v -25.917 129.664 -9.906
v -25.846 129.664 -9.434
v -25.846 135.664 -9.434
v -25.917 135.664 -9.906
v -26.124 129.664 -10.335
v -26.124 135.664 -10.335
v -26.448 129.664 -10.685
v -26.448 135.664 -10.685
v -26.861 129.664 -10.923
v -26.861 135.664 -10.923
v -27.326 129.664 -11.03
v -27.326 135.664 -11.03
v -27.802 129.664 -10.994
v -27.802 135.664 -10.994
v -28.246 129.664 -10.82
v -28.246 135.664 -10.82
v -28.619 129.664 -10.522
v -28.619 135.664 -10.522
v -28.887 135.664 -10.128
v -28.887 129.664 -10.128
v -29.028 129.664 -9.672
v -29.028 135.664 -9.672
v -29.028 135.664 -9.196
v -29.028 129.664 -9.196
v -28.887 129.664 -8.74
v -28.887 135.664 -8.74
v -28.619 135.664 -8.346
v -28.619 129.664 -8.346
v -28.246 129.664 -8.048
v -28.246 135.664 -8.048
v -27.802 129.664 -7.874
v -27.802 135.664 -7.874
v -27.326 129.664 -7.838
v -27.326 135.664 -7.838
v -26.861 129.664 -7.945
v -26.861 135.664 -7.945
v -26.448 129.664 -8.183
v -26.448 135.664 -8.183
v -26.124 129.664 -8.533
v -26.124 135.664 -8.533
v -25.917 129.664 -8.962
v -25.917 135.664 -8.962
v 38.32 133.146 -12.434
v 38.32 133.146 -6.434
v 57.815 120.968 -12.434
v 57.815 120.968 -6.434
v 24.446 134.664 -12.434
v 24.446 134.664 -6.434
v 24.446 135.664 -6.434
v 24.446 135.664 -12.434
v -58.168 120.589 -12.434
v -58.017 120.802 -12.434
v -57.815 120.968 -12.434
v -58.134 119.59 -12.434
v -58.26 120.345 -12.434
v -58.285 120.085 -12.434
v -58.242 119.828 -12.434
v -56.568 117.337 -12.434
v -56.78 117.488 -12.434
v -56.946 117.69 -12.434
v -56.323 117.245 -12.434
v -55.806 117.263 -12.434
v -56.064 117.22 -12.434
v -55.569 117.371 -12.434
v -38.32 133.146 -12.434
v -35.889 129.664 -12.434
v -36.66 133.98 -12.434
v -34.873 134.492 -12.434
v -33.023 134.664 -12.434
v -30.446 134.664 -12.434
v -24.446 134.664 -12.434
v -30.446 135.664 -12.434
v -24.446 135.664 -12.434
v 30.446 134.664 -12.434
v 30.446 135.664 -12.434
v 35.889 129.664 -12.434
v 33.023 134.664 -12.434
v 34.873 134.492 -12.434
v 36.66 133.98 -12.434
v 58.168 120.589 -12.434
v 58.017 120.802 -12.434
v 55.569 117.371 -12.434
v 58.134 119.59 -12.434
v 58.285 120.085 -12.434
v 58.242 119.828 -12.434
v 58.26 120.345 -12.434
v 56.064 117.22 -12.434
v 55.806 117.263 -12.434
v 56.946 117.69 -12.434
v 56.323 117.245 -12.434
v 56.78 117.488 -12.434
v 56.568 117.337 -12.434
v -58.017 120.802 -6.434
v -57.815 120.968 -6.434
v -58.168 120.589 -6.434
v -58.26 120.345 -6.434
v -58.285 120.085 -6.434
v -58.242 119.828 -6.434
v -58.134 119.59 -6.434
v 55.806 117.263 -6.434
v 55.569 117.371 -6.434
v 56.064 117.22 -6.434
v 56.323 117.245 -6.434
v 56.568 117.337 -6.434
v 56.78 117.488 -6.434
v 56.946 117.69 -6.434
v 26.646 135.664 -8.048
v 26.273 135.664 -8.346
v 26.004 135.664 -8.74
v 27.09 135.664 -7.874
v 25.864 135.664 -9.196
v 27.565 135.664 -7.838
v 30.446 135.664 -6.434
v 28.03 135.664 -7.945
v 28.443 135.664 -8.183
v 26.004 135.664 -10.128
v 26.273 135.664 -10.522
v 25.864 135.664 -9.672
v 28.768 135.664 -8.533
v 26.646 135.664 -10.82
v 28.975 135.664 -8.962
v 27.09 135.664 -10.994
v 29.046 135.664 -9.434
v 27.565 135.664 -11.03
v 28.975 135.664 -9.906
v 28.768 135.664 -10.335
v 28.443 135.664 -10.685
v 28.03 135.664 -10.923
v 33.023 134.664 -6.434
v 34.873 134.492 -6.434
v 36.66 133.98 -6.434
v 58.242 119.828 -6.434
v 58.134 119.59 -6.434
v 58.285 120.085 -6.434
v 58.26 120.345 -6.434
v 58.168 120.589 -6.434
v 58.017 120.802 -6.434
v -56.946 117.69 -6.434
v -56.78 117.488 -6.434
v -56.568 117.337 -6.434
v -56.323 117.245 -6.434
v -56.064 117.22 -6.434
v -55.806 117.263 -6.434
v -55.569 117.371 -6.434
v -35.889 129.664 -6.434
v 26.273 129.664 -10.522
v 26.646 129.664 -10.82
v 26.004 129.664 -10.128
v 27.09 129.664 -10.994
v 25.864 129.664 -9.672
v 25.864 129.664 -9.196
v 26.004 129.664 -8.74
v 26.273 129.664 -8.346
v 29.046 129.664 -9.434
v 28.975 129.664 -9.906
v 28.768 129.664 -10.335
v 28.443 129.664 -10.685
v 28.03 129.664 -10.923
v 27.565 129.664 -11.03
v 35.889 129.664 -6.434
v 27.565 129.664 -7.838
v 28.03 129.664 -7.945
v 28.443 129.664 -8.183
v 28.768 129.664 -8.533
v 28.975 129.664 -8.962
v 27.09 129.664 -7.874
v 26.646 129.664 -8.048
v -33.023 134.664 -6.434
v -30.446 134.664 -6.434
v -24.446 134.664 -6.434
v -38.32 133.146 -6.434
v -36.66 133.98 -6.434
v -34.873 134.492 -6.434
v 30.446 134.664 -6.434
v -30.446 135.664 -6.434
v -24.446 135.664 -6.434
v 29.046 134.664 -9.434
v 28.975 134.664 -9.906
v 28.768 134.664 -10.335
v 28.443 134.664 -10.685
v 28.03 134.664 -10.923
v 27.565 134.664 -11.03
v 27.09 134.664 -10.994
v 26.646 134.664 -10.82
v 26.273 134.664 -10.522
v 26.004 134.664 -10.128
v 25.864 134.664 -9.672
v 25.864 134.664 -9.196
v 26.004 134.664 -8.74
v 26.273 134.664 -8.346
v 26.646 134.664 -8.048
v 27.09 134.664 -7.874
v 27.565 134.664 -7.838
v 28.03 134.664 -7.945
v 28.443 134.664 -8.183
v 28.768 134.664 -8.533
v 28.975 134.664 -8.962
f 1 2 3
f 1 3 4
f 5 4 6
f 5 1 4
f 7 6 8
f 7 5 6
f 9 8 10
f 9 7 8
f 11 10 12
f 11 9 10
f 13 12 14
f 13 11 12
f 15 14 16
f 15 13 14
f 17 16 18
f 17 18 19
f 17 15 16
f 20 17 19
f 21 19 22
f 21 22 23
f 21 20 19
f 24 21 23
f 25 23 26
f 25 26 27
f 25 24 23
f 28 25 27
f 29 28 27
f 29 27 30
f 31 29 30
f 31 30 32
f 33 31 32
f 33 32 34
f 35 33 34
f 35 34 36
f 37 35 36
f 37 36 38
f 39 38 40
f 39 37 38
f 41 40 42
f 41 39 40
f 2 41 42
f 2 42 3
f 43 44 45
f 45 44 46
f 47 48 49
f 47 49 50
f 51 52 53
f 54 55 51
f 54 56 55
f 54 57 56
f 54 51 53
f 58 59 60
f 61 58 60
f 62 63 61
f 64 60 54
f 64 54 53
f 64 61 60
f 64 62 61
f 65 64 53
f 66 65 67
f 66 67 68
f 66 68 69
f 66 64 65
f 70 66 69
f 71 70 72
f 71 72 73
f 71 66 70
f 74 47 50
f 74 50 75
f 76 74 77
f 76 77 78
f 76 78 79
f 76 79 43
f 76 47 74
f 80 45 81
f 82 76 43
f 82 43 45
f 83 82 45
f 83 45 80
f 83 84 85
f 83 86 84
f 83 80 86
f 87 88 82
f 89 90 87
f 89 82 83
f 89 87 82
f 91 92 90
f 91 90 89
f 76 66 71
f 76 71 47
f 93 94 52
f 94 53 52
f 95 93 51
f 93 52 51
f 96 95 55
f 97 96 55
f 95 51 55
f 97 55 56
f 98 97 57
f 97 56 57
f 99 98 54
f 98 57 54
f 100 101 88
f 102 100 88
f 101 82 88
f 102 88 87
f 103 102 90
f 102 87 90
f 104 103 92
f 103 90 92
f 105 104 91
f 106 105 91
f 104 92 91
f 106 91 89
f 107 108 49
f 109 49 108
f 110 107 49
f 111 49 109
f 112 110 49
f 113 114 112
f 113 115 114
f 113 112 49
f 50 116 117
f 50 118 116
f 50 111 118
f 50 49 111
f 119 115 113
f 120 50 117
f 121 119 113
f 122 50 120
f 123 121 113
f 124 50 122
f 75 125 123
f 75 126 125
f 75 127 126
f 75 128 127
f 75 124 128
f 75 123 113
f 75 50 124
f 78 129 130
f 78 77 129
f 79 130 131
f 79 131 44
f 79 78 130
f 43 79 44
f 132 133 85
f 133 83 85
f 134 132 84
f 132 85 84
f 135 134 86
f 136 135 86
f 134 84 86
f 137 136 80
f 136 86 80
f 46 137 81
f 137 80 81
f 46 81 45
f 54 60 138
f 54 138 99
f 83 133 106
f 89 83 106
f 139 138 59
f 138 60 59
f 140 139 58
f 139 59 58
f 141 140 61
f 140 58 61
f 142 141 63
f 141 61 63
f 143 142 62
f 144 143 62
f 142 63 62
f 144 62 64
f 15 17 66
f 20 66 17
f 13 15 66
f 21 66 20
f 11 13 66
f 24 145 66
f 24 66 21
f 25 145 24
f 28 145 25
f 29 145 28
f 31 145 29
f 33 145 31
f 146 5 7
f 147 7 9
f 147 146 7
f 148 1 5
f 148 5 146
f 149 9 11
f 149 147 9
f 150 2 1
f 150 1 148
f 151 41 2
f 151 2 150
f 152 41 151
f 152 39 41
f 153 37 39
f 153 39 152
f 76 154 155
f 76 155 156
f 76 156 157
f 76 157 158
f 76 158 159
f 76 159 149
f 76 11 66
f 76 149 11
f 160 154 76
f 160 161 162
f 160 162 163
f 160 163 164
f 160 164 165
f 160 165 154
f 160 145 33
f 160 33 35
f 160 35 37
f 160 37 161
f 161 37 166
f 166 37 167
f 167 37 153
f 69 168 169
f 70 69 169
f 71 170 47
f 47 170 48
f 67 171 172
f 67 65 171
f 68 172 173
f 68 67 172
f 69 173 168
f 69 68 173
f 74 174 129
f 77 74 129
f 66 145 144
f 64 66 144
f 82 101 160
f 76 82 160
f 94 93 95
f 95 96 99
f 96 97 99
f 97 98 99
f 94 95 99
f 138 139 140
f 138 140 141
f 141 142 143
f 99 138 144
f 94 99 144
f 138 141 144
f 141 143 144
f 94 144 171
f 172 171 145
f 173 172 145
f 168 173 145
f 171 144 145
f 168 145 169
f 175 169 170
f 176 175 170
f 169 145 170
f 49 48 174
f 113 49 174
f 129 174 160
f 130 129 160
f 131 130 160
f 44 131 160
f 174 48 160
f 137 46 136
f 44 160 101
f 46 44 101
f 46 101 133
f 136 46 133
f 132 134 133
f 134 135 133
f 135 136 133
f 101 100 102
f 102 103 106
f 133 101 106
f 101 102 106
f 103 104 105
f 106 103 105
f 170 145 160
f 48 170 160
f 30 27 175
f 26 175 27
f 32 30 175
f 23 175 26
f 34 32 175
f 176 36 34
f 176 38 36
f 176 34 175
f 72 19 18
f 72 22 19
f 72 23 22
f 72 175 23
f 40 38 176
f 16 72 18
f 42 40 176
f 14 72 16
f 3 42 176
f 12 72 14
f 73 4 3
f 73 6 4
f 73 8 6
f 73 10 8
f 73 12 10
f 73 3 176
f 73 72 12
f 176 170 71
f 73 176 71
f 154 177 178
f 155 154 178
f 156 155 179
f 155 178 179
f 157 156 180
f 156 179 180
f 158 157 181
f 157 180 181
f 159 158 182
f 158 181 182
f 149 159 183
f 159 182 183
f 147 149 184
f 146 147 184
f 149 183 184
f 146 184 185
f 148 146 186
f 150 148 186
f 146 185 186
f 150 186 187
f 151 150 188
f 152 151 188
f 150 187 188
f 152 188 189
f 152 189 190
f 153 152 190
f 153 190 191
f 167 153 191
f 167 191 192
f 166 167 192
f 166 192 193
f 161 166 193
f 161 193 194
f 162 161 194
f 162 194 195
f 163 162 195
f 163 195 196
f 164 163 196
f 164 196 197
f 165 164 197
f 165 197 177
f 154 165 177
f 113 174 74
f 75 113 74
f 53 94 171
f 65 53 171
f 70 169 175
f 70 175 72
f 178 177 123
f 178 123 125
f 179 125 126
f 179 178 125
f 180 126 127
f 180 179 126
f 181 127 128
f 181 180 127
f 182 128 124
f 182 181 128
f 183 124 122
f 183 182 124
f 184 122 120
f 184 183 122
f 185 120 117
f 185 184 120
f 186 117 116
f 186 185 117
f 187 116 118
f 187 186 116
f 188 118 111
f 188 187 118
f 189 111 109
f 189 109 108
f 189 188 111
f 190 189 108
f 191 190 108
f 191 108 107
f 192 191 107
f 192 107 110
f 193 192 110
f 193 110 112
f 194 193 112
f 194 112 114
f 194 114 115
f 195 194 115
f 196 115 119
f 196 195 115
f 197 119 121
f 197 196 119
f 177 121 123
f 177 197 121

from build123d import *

# Parameters (mm, degrees)
EXTRUDE_1_DEPTH      = 3
SKETCH_7_R           = 2.25
CUT_EXTRUDE_2_DEPTH  = 4.0000001
SKETCH_8_R           = 8
CUT_EXTRUDE_3_DEPTH  = 4.0000001
CUT_EXTRUDE_4_DEPTH  = 3
CUT_EXTRUDE_5_DEPTH  = 3
CUT_EXTRUDE_8_DEPTH  = 3
SKETCH_12_R          = 1.7
CUT_EXTRUDE_9_DEPTH  = 3
SKETCH_13_R          = 1.7
CUT_EXTRUDE_11_DEPTH = 3
CUT_EXTRUDE_12_DEPTH = 4.0000001
FILLET_1_R           = 2
FILLET_2_R           = 2
CUT_EXTRUDE_13_DEPTH = 4.0000001
CUT_EXTRUDE_14_DEPTH = 4.0000001
CUT_EXTRUDE_15_DEPTH = 4.0000001
CUT_EXTRUDE_16_DEPTH = 4.0000001
SKETCH_19_W          = 174.604309186
SKETCH_19_H          = 153.794857067
CUT_EXTRUDE_17_DEPTH = 10
SKETCH_20_R          = 1.7
SKETCH_20_R_2        = 2.929115441
EXTRUDE_2_DEPTH      = 5
SKETCH_21_W          = 71.778327268
SKETCH_21_H          = 4.999657954
EXTRUDE_3_DEPTH      = 5
EXTRUDE_4_DEPTH      = 5
FILLET_3_R           = 10
SKETCH_23_W          = 71.778327268
SKETCH_23_H          = 4.999657954
EXTRUDE_5_DEPTH      = 5
FILLET_4_R           = 1
SKETCH_24_W          = 6
SKETCH_24_H          = 4.999657954
EXTRUDE_7_DEPTH      = 55
EXTRUDE_8_DEPTH      = 4.999658
FILLET_5_R           = 8
FILLET_6_R           = 12
SKETCH_27_W          = 5
SKETCH_27_H          = 6
EXTRUDE_9_DEPTH      = 4.999658
FILLET_7_R           = 1
FILLET_8_R           = 1
FILLET_9_R           = 1
SKETCH_28_R          = 1.6
CUT_EXTRUDE_19_DEPTH = 50
EXTRUDE_10_DEPTH     = 6
SKETCH_33_R          = 1.6
CUT_EXTRUDE_21_DEPTH = 10.999657954
SKETCH_34_W          = 162.843072653
SKETCH_34_H          = 93.113374014
CUT_EXTRUDE_22_DEPTH = 10
SKETCH_35_W          = 6
SKETCH_35_H          = 6
SKETCH_35_R          = 1.6
EXTRUDE_11_DEPTH     = 1
CUT_EXTRUDE_23_DEPTH = 90
SKETCH_37_W          = 26
SKETCH_37_H          = 5
CUT_EXTRUDE_24_DEPTH = 90
FILLET_10_R          = 10
FILLET_11_R          = 1


with BuildPart() as part:
    # 草图1 → 凸台-拉伸1 (new body)
    with BuildSketch(Plane.XY):
        with BuildLine():
            Line((60, 106.603296002), (35.889163634, 121.664519159))
            Line((35.889163634, 121.664519159), (-35.889163634, 121.664519159))
            Line((-35.889163634, 121.664519159), (-60, 106.603296002))
            Line((-60, 106.603296002), (-60, 94.801892265))
            Line((-60, 94.801892265), (-45, 94.801892265))
            ThreePointArc((-45, 94.801892265), (-43.762563133, 94.289329132), (-43.25, 93.051892265))
            Line((-43.25, 93.051892265), (-37.75, 93.051892265))
            ThreePointArc((-37.75, 93.051892265), (-37.237436867, 94.289329132), (-36, 94.801892265))
            Line((-36, 94.801892265), (-21, 94.801892265))
            ThreePointArc((-21, 94.801892265), (-19.762563133, 94.289329132), (-19.25, 93.051892265))
            Line((-19.25, 93.051892265), (19.25, 93.051892265))
            ThreePointArc((19.25, 93.051892265), (19.762563133, 94.289329132), (21, 94.801892265))
            Line((21, 94.801892265), (36, 94.801892265))
            ThreePointArc((36, 94.801892265), (37.237436867, 94.289329132), (37.75, 93.051892265))
            Line((37.75, 93.051892265), (43.25, 93.051892265))
            ThreePointArc((43.25, 93.051892265), (43.762563133, 94.289329132), (45, 94.801892265))
            Line((45, 94.801892265), (60, 94.801892265))
            Line((60, 94.801892265), (60, 106.603296002))
        make_face()
        with BuildLine():
            Line((66.901694095, 102.292041372), (60, 106.603296002))
            Line((60, 106.603296002), (60, 94.801892265))
            ThreePointArc((60, 94.801892265), (61.237436867, 94.289329132), (61.75, 93.051892265))
            Line((61.75, 93.051892265), (66.901694095, 93.051892265))
            Line((66.901694095, 93.051892265), (66.901694095, 102.292041372))
        make_face()
        with BuildLine():
            Line((-60, 94.801892265), (-60, 106.603296002))
            Line((-60, 106.603296002), (-66.901694095, 102.292041372))
            Line((-66.901694095, 102.292041372), (-66.901694095, 93.051892265))
            Line((-66.901694095, 93.051892265), (-61.75, 93.051892265))
            ThreePointArc((-61.75, 93.051892265), (-61.237436867, 94.289329132), (-60, 94.801892265))
        make_face()
        with BuildLine():
            Line((66.901694095, 63.051892265), (66.901694095, 93.051892265))
            Line((66.901694095, 93.051892265), (61.75, 93.051892265))
            ThreePointArc((61.75, 93.051892265), (61.237436867, 91.814455398), (60, 91.301892265))
            Line((60, 91.301892265), (60, 64.801892265))
            ThreePointArc((60, 64.801892265), (61.237436867, 64.289329132), (61.75, 63.051892265))
            Line((61.75, 63.051892265), (66.901694095, 63.051892265))
        make_face()
        with BuildLine():
            Line((-61.75, 93.051892265), (-66.901694095, 93.051892265))
            Line((-66.901694095, 93.051892265), (-66.901694095, 63.051892265))
            Line((-66.901694095, 63.051892265), (-61.75, 63.051892265))
            ThreePointArc((-61.75, 63.051892265), (-61.237436867, 64.289329132), (-60, 64.801892265))
            Line((-60, 64.801892265), (-60, 91.301892265))
            ThreePointArc((-60, 91.301892265), (-61.237436867, 91.814455398), (-61.75, 93.051892265))
        make_face()
        with BuildLine():
            Line((66.901694095, 52.870133869), (66.901694095, 63.051892265))
            Line((66.901694095, 63.051892265), (61.75, 63.051892265))
            ThreePointArc((61.75, 63.051892265), (61.237436867, 61.814455398), (60, 61.301892265))
            Line((60, 61.301892265), (60, 31.261343001))
            Line((60, 31.261343001), (75, 31.261343001))
            Line((75, 31.261343001), (75, 40.933889795))
            ThreePointArc((75, 40.933889795), (69.117351927, 45.658052319), (66.901694095, 52.870133869))
        make_face()
        with BuildLine():
            Line((60, 64.801892265), (60, 91.301892265))
            Line((60, 91.301892265), (45, 91.301892265))
            ThreePointArc((45, 91.301892265), (43.762563133, 91.814455398), (43.25, 93.051892265))
            Line((43.25, 93.051892265), (37.75, 93.051892265))
            ThreePointArc((37.75, 93.051892265), (37.237436867, 91.814455398), (36, 91.301892265))
            Line((36, 91.301892265), (21, 91.301892265))
            ThreePointArc((21, 91.301892265), (19.762563133, 91.814455398), (19.25, 93.051892265))
            Line((19.25, 93.051892265), (-19.25, 93.051892265))
            ThreePointArc((-19.25, 93.051892265), (-19.762563133, 91.814455398), (-21, 91.301892265))
            Line((-21, 91.301892265), (-36, 91.301892265))
            ThreePointArc((-36, 91.301892265), (-37.237436867, 91.814455398), (-37.75, 93.051892265))
            Line((-37.75, 93.051892265), (-43.25, 93.051892265))
            ThreePointArc((-43.25, 93.051892265), (-43.762563133, 91.814455398), (-45, 91.301892265))
            Line((-45, 91.301892265), (-60, 91.301892265))
            Line((-60, 91.301892265), (-60, 64.801892265))
            Line((-60, 64.801892265), (-45, 64.801892265))
            ThreePointArc((-45, 64.801892265), (-43.762563133, 64.289329132), (-43.25, 63.051892265))
            Line((-43.25, 63.051892265), (-37.75, 63.051892265))
            ThreePointArc((-37.75, 63.051892265), (-37.237436867, 64.289329132), (-36, 64.801892265))
            Line((-36, 64.801892265), (-21, 64.801892265))
            ThreePointArc((-21, 64.801892265), (-19.762563133, 64.289329132), (-19.25, 63.051892265))
            Line((-19.25, 63.051892265), (19.25, 63.051892265))
            ThreePointArc((19.25, 63.051892265), (19.762563133, 64.289329132), (21, 64.801892265))
            Line((21, 64.801892265), (36, 64.801892265))
            ThreePointArc((36, 64.801892265), (37.237436867, 64.289329132), (37.75, 63.051892265))
            Line((37.75, 63.051892265), (43.25, 63.051892265))
            ThreePointArc((43.25, 63.051892265), (43.762563133, 64.289329132), (45, 64.801892265))
            Line((45, 64.801892265), (60, 64.801892265))
        make_face()
        with BuildLine():
            Line((-61.75, 63.051892265), (-66.901694095, 63.051892265))
            Line((-66.901694095, 63.051892265), (-66.901694095, 52.870133869))
            ThreePointArc((-66.901694095, 52.870133869), (-69.117351927, 45.658052319), (-75, 40.933889795))
            Line((-75, 40.933889795), (-75, 31.261343001))
            Line((-75, 31.261343001), (-60, 31.261343001))
            Line((-60, 31.261343001), (-60, 61.301892265))
            ThreePointArc((-60, 61.301892265), (-61.237436867, 61.814455398), (-61.75, 63.051892265))
        make_face()
        with BuildLine():
            Line((60, 31.261343001), (60, 61.301892265))
            Line((60, 61.301892265), (45, 61.301892265))
            ThreePointArc((45, 61.301892265), (43.762563133, 61.814455398), (43.25, 63.051892265))
            Line((43.25, 63.051892265), (37.75, 63.051892265))
            ThreePointArc((37.75, 63.051892265), (37.237436867, 61.814455398), (36, 61.301892265))
            Line((36, 61.301892265), (21, 61.301892265))
            ThreePointArc((21, 61.301892265), (19.762563133, 61.814455398), (19.25, 63.051892265))
            Line((19.25, 63.051892265), (-19.25, 63.051892265))
            ThreePointArc((-19.25, 63.051892265), (-19.762563133, 61.814455398), (-21, 61.301892265))
            Line((-21, 61.301892265), (-36, 61.301892265))
            ThreePointArc((-36, 61.301892265), (-37.237436867, 61.814455398), (-37.75, 63.051892265))
            Line((-37.75, 63.051892265), (-43.25, 63.051892265))
            ThreePointArc((-43.25, 63.051892265), (-43.762563133, 61.814455398), (-45, 61.301892265))
            Line((-45, 61.301892265), (-60, 61.301892265))
            Line((-60, 61.301892265), (-60, 31.261343001))
            Line((-60, 31.261343001), (60, 31.261343001))
        make_face()
        with BuildLine():
            Line((60, -58.312864289), (60, 23.940028391))
            Line((60, 23.940028391), (-60, 23.940028391))
            Line((-60, 23.940028391), (-60, -58.312864289))
            Line((-60, -58.312864289), (-45, -58.312864289))
            ThreePointArc((-45, -58.312864289), (-43.25, -60.062864289), (-45, -61.812864289))
            Line((-45, -61.812864289), (-60, -61.812864289))
            Line((-60, -61.812864289), (-60, -88.312864289))
            Line((-60, -88.312864289), (-45, -88.312864289))
            ThreePointArc((-45, -88.312864289), (-43.25, -90.062864289), (-45, -91.812864289))
            Line((-45, -91.812864289), (-60, -91.812864289))
            Line((-60, -91.812864289), (-60, -111.849967256))
            Line((-60, -111.849967256), (-38.845469114, -105.590576733))
            ThreePointArc((-38.845469114, -105.590576733), (-36.037784492, -104.975210108), (-33.17088573, -104.768665882))
            Line((-33.17088573, -104.768665882), (33.17088573, -104.768665882))
            ThreePointArc((33.17088573, -104.768665882), (36.037784492, -104.975210108), (38.845469114, -105.590576733))
            Line((38.845469114, -105.590576733), (60, -111.849967256))
            Line((60, -111.849967256), (60, -91.812864289))
            Line((60, -91.812864289), (45, -91.812864289))
            ThreePointArc((45, -91.812864289), (43.762563133, -91.300301156), (43.25, -90.062864289))
            ThreePointArc((43.25, -90.062864289), (43.762563133, -88.825427422), (45, -88.312864289))
            Line((45, -88.312864289), (60, -88.312864289))
            Line((60, -88.312864289), (60, -61.812864289))
            Line((60, -61.812864289), (45, -61.812864289))
            ThreePointArc((45, -61.812864289), (43.762563133, -61.300301156), (43.25, -60.062864289))
            ThreePointArc((43.25, -60.062864289), (43.762563133, -58.825427422), (45, -58.312864289))
            Line((45, -58.312864289), (60, -58.312864289))
        make_face()
        with BuildLine():
            ThreePointArc((-21, -88.312864289), (-19.762563133, -88.825427422), (-19.25, -90.062864289))
            ThreePointArc((-19.25, -90.062864289), (-19.762563133, -91.300301156), (-21, -91.812864289))
            Line((-21, -91.812864289), (-36, -91.812864289))
            ThreePointArc((-36, -91.812864289), (-37.75, -90.062864289), (-36, -88.312864289))
            Line((-36, -88.312864289), (-21, -88.312864289))
        make_face(mode=Mode.SUBTRACT)
        with BuildLine():
            ThreePointArc((-21, -58.312864289), (-19.762563133, -58.825427422), (-19.25, -60.062864289))
            ThreePointArc((-19.25, -60.062864289), (-19.762563133, -61.300301156), (-21, -61.812864289))
            Line((-21, -61.812864289), (-36, -61.812864289))
            ThreePointArc((-36, -61.812864289), (-37.75, -60.062864289), (-36, -58.312864289))
            Line((-36, -58.312864289), (-21, -58.312864289))
        make_face(mode=Mode.SUBTRACT)
        with BuildLine():
            ThreePointArc((36, -88.312864289), (37.237436867, -88.825427422), (37.75, -90.062864289))
            ThreePointArc((37.75, -90.062864289), (37.237436867, -91.300301156), (36, -91.812864289))
            Line((36, -91.812864289), (21, -91.812864289))
            ThreePointArc((21, -91.812864289), (19.762563133, -91.300301156), (19.25, -90.062864289))
            ThreePointArc((19.25, -90.062864289), (19.762563133, -88.825427422), (21, -88.312864289))
            Line((21, -88.312864289), (36, -88.312864289))
        make_face(mode=Mode.SUBTRACT)
        with BuildLine():
            ThreePointArc((36, -58.312864289), (37.237436867, -58.825427422), (37.75, -60.062864289))
            ThreePointArc((37.75, -60.062864289), (37.237436867, -61.300301156), (36, -61.812864289))
            Line((36, -61.812864289), (21, -61.812864289))
            ThreePointArc((21, -61.812864289), (19.762563133, -61.300301156), (19.25, -60.062864289))
            ThreePointArc((19.25, -60.062864289), (19.762563133, -58.825427422), (21, -58.312864289))
            Line((21, -58.312864289), (36, -58.312864289))
        make_face(mode=Mode.SUBTRACT)
        with BuildLine():
            Line((75, 23.940028391), (60, 23.940028391))
            Line((60, 23.940028391), (60, -58.312864289))
            ThreePointArc((60, -58.312864289), (61.237436867, -58.825427422), (61.75, -60.062864289))
            Line((61.75, -60.062864289), (67.402721334, -60.062864289))
            add(Edge.make_bspline(
                [(75, 10.562559835), (72.695878257, 1.907314233), (70.339582535, -13.372796253), (67.818206704, -36.939032951), (67.208860388, -51.77269444), (67.402721334, -60.062864289)],
                knots=[0, 0, 0, 0, 0.235246678, 0.40629419, 0.624108181, 0.624108181, 0.624108181, 0.624108181], degree=3))
            Line((75, 10.562559835), (75, 23.940028391))
        make_face()
        with BuildLine():
            Line((-60, -58.312864289), (-60, 23.940028391))
            Line((-60, 23.940028391), (-75, 23.940028391))
            Line((-75, 23.940028391), (-75, 10.562559835))
            add(Edge.make_bspline(
                [(-75, 10.562559835), (-72.695878257, 1.907314233), (-70.339582535, -13.372796253), (-67.818206704, -36.939032951), (-67.208860388, -51.77269444), (-67.402721334, -60.062864289)],
                knots=[0, 0, 0, 0, 0.235246678, 0.40629419, 0.624108181, 0.624108181, 0.624108181, 0.624108181], degree=3))
            add(Edge.make_bspline(
                [(-67.402721334, -60.062864289), (-67.560325872, -66.802583754), (-68.323504015, -76.843670093), (-70.154131955, -86.778530076), (-70.533712858, -90.062864289)],
                knots=[0.624108181, 0.624108181, 0.624108181, 0.624108181, 0.801186001, 0.888408652, 0.888408652, 0.888408652, 0.888408652], degree=3))
            add(Edge.make_bspline(
                [(-70.533712858, -90.062864289), (-71.019342956, -94.264792095), (-71.137422935, -98.476048206), (-70.1742624, -102.732794059)],
                knots=[0.888408652, 0.888408652, 0.888408652, 0.888408652, 1, 1, 1, 1], degree=3))
            Line((-70.1742624, -102.732794059), (-66.460817635, -113.761651372))
            Line((-66.460817635, -113.761651372), (-60, -111.849967256))
            Line((-60, -111.849967256), (-60, -91.812864289))
            ThreePointArc((-60, -91.812864289), (-61.75, -90.062864289), (-60, -88.312864289))
            Line((-60, -88.312864289), (-60, -61.812864289))
            ThreePointArc((-60, -61.812864289), (-61.75, -60.062864289), (-60, -58.312864289))
        make_face()
        with BuildLine():
            Line((67.402721334, -60.062864289), (61.75, -60.062864289))
            ThreePointArc((61.75, -60.062864289), (61.237436867, -61.300301156), (60, -61.812864289))
            Line((60, -61.812864289), (60, -88.312864289))
            ThreePointArc((60, -88.312864289), (61.237436867, -88.825427422), (61.75, -90.062864289))
            Line((61.75, -90.062864289), (70.533712858, -90.062864289))
            add(Edge.make_bspline(
                [(67.402721334, -60.062864289), (67.560325872, -66.802583754), (68.323504015, -76.843670093), (70.154131955, -86.778530076), (70.533712858, -90.062864289)],
                knots=[0.624108181, 0.624108181, 0.624108181, 0.624108181, 0.801186001, 0.888408652, 0.888408652, 0.888408652, 0.888408652], degree=3))
        make_face()
        with BuildLine():
            add(Edge.make_bspline(
                [(70.533712858, -90.062864289), (71.019342956, -94.264792095), (71.137422935, -98.476048206), (70.1742624, -102.732794059)],
                knots=[0.888408652, 0.888408652, 0.888408652, 0.888408652, 1, 1, 1, 1], degree=3))
            Line((70.533712858, -90.062864289), (61.75, -90.062864289))
            ThreePointArc((61.75, -90.062864289), (61.237436867, -91.300301156), (60, -91.812864289))
            Line((60, -91.812864289), (60, -111.849967256))
            Line((60, -111.849967256), (66.460817635, -113.761651372))
            Line((66.460817635, -113.761651372), (70.1742624, -102.732794059))
        make_face()
    extrude(amount=EXTRUDE_1_DEPTH)

    # 草图7 → 切除-拉伸2 (cut, through all)
    with BuildSketch(Plane(origin=(0, 0, 0), x_dir=(-1, 0, 0), z_dir=(0, 0, -1))):
        with Locations((-21, 41.261343001)):
            Circle(SKETCH_7_R)
        with Locations((21, 41.261343001)):
            Circle(SKETCH_7_R)
        with Locations((-21, 13.940028391)):
            Circle(SKETCH_7_R)
        with Locations((21, 13.940028391)):
            Circle(SKETCH_7_R)
    extrude(amount=-CUT_EXTRUDE_2_DEPTH, mode=Mode.SUBTRACT)

    # 草图8 → 切除-拉伸3 (cut, through all)
    with BuildSketch(Plane.XY.offset(3)):
        with BuildLine():
            Line((-12.621438714, -0.378557945), (-33.409010345, 20.409013685))
            ThreePointArc((-33.409010345, 20.409013685), (-36.590999434, 20.409013643), (-36.590999309, 17.227024553))
            Line((-36.590999309, 17.227024553), (-15.803426586, -3.560545984))
            ThreePointArc((-15.803426586, -3.560545984), (-12.621438673, -3.560545859), (-12.621438714, -0.378557945))
        make_face()
        with BuildLine():
            Line((33.410462056, 20.410458798), (12.572988319, -0.427010824))
            ThreePointArc((12.572988319, -0.427010824), (12.644570441, -3.584764993), (15.803045702, -3.56090242))
            Line((15.803045702, -3.56090242), (34.999999982, 15.636052774))
            Line((34.999999982, 15.636052774), (36.588086952, 17.224139819))
            ThreePointArc((36.588086952, 17.224139819), (36.592433993, 20.406111757), (33.410462056, 20.410458798))
        make_face()
        with BuildLine():
            Line((-15.803784812, -28.80377835), (-36.591002186, -49.590991619))
            ThreePointArc((-36.591002186, -49.590991619), (-36.591002403, -52.772972232), (-33.40902179, -52.772972254))
            Line((-33.40902179, -52.772972254), (-12.573723916, -31.937673388))
            ThreePointArc((-12.573723916, -31.937673388), (-12.64530628, -28.779915954), (-15.803784812, -28.80377835))
        make_face()
        with BuildLine():
            Line((36.590992666, -49.590989326), (15.803414627, -28.803411286))
            ThreePointArc((15.803414627, -28.803411286), (12.654338964, -28.769774302), (12.55344336, -31.917412949))
            Line((12.55344336, -31.917412949), (33.409007381, -52.772974779))
            ThreePointArc((33.409007381, -52.772974779), (36.590992708, -52.772974653), (36.590992666, -49.590989326))
        make_face()
        with Locations((-0.000368782, -16.182341354)):
            Circle(SKETCH_8_R)
    extrude(amount=-CUT_EXTRUDE_3_DEPTH, mode=Mode.SUBTRACT)

    # 草图9 → 切除-拉伸4 (cut)
    with BuildSketch(Plane.XY.offset(3)):
        with BuildLine():
            Line((55, -100.49704609), (20, -100.49704609))
            ThreePointArc((20, -100.49704609), (18.25, -98.74704609), (20, -96.99704609))
            Line((20, -96.99704609), (55, -96.99704609))
            ThreePointArc((55, -96.99704609), (56.75, -98.74704609), (55, -100.49704609))
        make_face()
        with BuildLine():
            Line((-55, -96.99704609), (-20, -96.99704609))
            ThreePointArc((-20, -96.99704609), (-18.25, -98.74704609), (-20, -100.49704609))
            Line((-20, -100.49704609), (-55, -100.49704609))
            ThreePointArc((-55, -100.49704609), (-56.75, -98.74704609), (-55, -96.99704609))
        make_face()
    extrude(amount=-CUT_EXTRUDE_4_DEPTH, mode=Mode.SUBTRACT)

    # 草图10 → 切除-拉伸5 (cut)
    with BuildSketch(Plane.XY.offset(3)):
        with BuildLine():
            Line((12.5, -80.062864289), (-12.5, -80.062864289))
            ThreePointArc((-12.5, -80.062864289), (-17.5, -75.062864289), (-12.5, -70.062864289))
            Line((-12.5, -70.062864289), (12.5, -70.062864289))
            ThreePointArc((12.5, -70.062864289), (17.5, -75.062864289), (12.5, -80.062864289))
        make_face()
    extrude(amount=-CUT_EXTRUDE_5_DEPTH, mode=Mode.SUBTRACT)

    # 草图11 → 切除-拉伸8 (cut)
    with BuildSketch(Plane.XY.offset(3)):
        with BuildLine():
            Line((15, 73.051892265), (-15, 73.051892265))
            ThreePointArc((-15, 73.051892265), (-20, 78.051892265), (-15, 83.051892265))
            Line((-15, 83.051892265), (15, 83.051892265))
            ThreePointArc((15, 83.051892265), (20, 78.051892265), (15, 73.051892265))
        make_face()
    extrude(amount=-CUT_EXTRUDE_8_DEPTH, mode=Mode.SUBTRACT)

    # 草图12 → 切除-拉伸9 (cut)
    with BuildSketch(Plane.XY.offset(3)):
        with Locations((0, 114.371786435)):
            Circle(SKETCH_12_R)
        with Locations((0, 98.371786435)):
            Circle(SKETCH_12_R)
        with Locations((8, 106.371786435)):
            Circle(SKETCH_12_R)
        with Locations((-8, 106.371786435)):
            Circle(SKETCH_12_R)
    extrude(amount=-CUT_EXTRUDE_9_DEPTH, mode=Mode.SUBTRACT)

    # 草图13 → 切除-拉伸11 (cut)
    with BuildSketch(Plane.XY.offset(3)):
        with Locations((0, -84.415765086)):
            Circle(SKETCH_13_R)
        with Locations((8, -92.415765086)):
            Circle(SKETCH_13_R)
        with Locations((0, -100.415765086)):
            Circle(SKETCH_13_R)
        with Locations((-8, -92.415765086)):
            Circle(SKETCH_13_R)
    extrude(amount=-CUT_EXTRUDE_11_DEPTH, mode=Mode.SUBTRACT)

    # 草图14 → 切除-拉伸12 (cut, through all)
    with BuildSketch(Plane.XY.offset(3)):
        with BuildLine():
            Line((-55.475501567, 8.919687236), (-55.475501567, -46.080312764))
            ThreePointArc((-55.475501567, -46.080312764), (-57.225501567, -47.830312764), (-58.975501567, -46.080312764))
            Line((-58.975501567, -46.080312764), (-58.975501567, 8.919687236))
            ThreePointArc((-58.975501567, 8.919687236), (-57.225501567, 10.669687236), (-55.475501567, 8.919687236))
        make_face()
        with BuildLine():
            Line((58.975501567, 8.919687236), (58.975501567, -46.080312764))
            ThreePointArc((58.975501567, -46.080312764), (57.225501567, -47.830312764), (55.475501567, -46.080312764))
            Line((55.475501567, -46.080312764), (55.475501567, 8.919687236))
            ThreePointArc((55.475501567, 8.919687236), (57.225501567, 10.669687236), (58.975501567, 8.919687236))
        make_face()
    extrude(amount=-CUT_EXTRUDE_12_DEPTH, mode=Mode.SUBTRACT)

    # 圆角1
    fillet_1_edges = [part.edges().sort_by_distance(p)[0] for p in [
        (75, 31.261343001, 1.5),
        (-75, 31.261343001, 1.5),
    ]]
    fillet(fillet_1_edges, radius=FILLET_1_R)

    # 圆角2
    fillet_2_edges = [part.edges().sort_by_distance(p)[0] for p in [
        (-75, 23.940028391, 1.5),
        (75, 23.940028391, 1.5),
    ]]
    fillet(fillet_2_edges, radius=FILLET_2_R)

    # 草图15 → 切除-拉伸13 (cut, through all)
    with BuildSketch(Plane(origin=(0, 0, 0), x_dir=(-1, 0, 0), z_dir=(0, 0, -1))):
        with BuildLine():
            Line((-61.184216401, 102.403501276), (-34.774762862, 118.900592756))
            ThreePointArc((-34.774762862, 118.900592756), (-32.70788159, 118.423097411), (-33.185376934, 116.356216138))
            Line((-33.185376934, 116.356216138), (-59.594830473, 99.859124658))
            ThreePointArc((-59.594830473, 99.859124658), (-61.661711746, 100.336620003), (-61.184216401, 102.403501276))
        make_face()
        with BuildLine():
            Line((59.594830473, 99.859124658), (33.185376934, 116.356216138))
            ThreePointArc((33.185376934, 116.356216138), (32.70788159, 118.423097411), (34.774762862, 118.900592756))
            Line((34.774762862, 118.900592756), (61.184216401, 102.403501276))
            ThreePointArc((61.184216401, 102.403501276), (61.661711746, 100.336620003), (59.594830473, 99.859124658))
        make_face()
    extrude(amount=-CUT_EXTRUDE_13_DEPTH, mode=Mode.SUBTRACT)

    # 草图16 → 切除-拉伸14 (cut, through all)
    with BuildSketch(Plane(origin=(0, 0, 0), x_dir=(-1, 0, 0), z_dir=(0, 0, -1))):
        with BuildLine():
            Line((-61.516979467, 42.761343001), (-32.056291893, 42.761343001))
            ThreePointArc((-32.056291893, 42.761343001), (-30.556291893, 41.261343001), (-32.056291893, 39.761343001))
            Line((-32.056291893, 39.761343001), (-61.516979467, 39.761343001))
            ThreePointArc((-61.516979467, 39.761343001), (-63.016979467, 41.261343001), (-61.516979467, 42.761343001))
        make_face()
        with BuildLine():
            Line((61.516979467, 39.761343001), (32.056291893, 39.761343001))
            ThreePointArc((32.056291893, 39.761343001), (30.556291893, 41.261343001), (32.056291893, 42.761343001))
            Line((32.056291893, 42.761343001), (61.516979467, 42.761343001))
            ThreePointArc((61.516979467, 42.761343001), (63.016979467, 41.261343001), (61.516979467, 39.761343001))
        make_face()
    extrude(amount=-CUT_EXTRUDE_14_DEPTH, mode=Mode.SUBTRACT)

    # 草图17 → 切除-拉伸15 (cut, through all)
    with BuildSketch(Plane(origin=(0, 0, 0), x_dir=(-1, 0, 0), z_dir=(0, 0, -1))):
        Polygon((-28.645414283, -8.118433382), (-34.644957411, -20.11751964), (-34.644957411, -29.946558382), (-37.580904049, -29.946558382), (-37.580904049, -20.11751964), (-43.580447177, -8.118433382), (-40.64450054, -8.118433382), (-36.176755657, -17.43687271), (-36.049105803, -17.43687271), (-31.58136092, -8.118433382), align=None)
    extrude(amount=-CUT_EXTRUDE_15_DEPTH, mode=Mode.SUBTRACT)

    # 草图18 → 切除-拉伸16 (cut, through all)
    with BuildSketch(Plane(origin=(0, 0, 0), x_dir=(-1, 0, 0), z_dir=(0, 0, -1))):
        Polygon((46.06697123, -29.087529791), (43.131024593, -29.087529791), (43.131024593, -18.875541487), (35.854982926, -18.875541487), (35.854982926, -29.087529791), (32.919036289, -29.087529791), (32.919036289, -7.259404791), (35.854982926, -7.259404791), (35.854982926, -16.450194265), (43.131024593, -16.450194265), (43.131024593, -7.259404791), (46.06697123, -7.259404791), align=None)
    extrude(amount=-CUT_EXTRUDE_16_DEPTH, mode=Mode.SUBTRACT)

    # 草图19 → 切除-拉伸17 (cut)
    with BuildSketch(Plane(origin=(0, 0, 0), x_dir=(-1, 0, 0), z_dir=(0, 0, -1))):
        with Locations((0, -49.372787161)):
            Rectangle(SKETCH_19_W, SKETCH_19_H)
    extrude(amount=-CUT_EXTRUDE_17_DEPTH, mode=Mode.SUBTRACT)

    # 草图34 → 切除-拉伸22 (cut)
    with BuildSketch(Plane(origin=(0, 0, 0), x_dir=(-1, 0, 0), z_dir=(0, 0, -1))):
        with Locations((1.208964771, 75.898201893)):
            Rectangle(SKETCH_34_W, SKETCH_34_H)
    extrude(amount=-CUT_EXTRUDE_22_DEPTH, mode=Mode.SUBTRACT)


with BuildPart() as body_2:
    # 草图20 → 凸台-拉伸2 (new body)
    with BuildSketch(Plane.XY.offset(13)):
        with BuildLine():
            Line((-13, 106.371786435), (-13, 129.664519159))
            Line((-13, 129.664519159), (13, 129.664519159))
            Line((13, 129.664519159), (13, 106.371786435))
            ThreePointArc((13, 106.371786435), (0, 93.371786435), (-13, 106.371786435))
        make_face()
        with Locations((0, 98.371786435)):
            Circle(SKETCH_20_R, mode=Mode.SUBTRACT)
        with Locations((-8, 106.371786435)):
            Circle(SKETCH_20_R, mode=Mode.SUBTRACT)
        with Locations((8, 106.371786435)):
            Circle(SKETCH_20_R, mode=Mode.SUBTRACT)
        with Locations((0, 114.371786435)):
            Circle(SKETCH_20_R, mode=Mode.SUBTRACT)
        with Locations((0, 106.371786435)):
            Circle(SKETCH_20_R_2, mode=Mode.SUBTRACT)
    extrude(amount=EXTRUDE_2_DEPTH)

    # 草图21 → 凸台-拉伸3 (add)
    with BuildSketch(Plane.XY.offset(18)):
        with Locations((0, 127.164522428)):
            Rectangle(SKETCH_21_W, SKETCH_21_H)
    extrude(amount=-EXTRUDE_3_DEPTH)

    # 草图22 → 凸台-拉伸4 (add)
    with BuildSketch(Plane.XY.offset(18)):
        Polygon((-24.444581817, 124.664693451), (-13, 116.664693451), (-13, 124.664693451), align=None)
        Polygon((24.444581817, 124.664693451), (13, 116.664693451), (13, 124.664693451), align=None)
    extrude(amount=-EXTRUDE_4_DEPTH)

    # 圆角3
    fillet_3_edges = [body_2.edges().sort_by_distance(p)[0] for p in [
        (-24.444581817, 124.664693451, 15.5),
        (-13, 116.664693451, 15.5),
        (24.444581817, 124.664693451, 15.5),
        (13, 116.664693451, 15.5),
    ]]
    fillet(fillet_3_edges, radius=FILLET_3_R)

    # 草图23 → 凸台-拉伸5 (add)
    with BuildSketch(Plane(origin=(0, 0, 13), x_dir=(-1, 0, 0), z_dir=(0, 0, -1))):
        with Locations((0, 127.164522428)):
            Rectangle(SKETCH_23_W, SKETCH_23_H)
    extrude(amount=EXTRUDE_5_DEPTH)

    # 圆角4
    fillet_4_edges = [body_2.edges().sort_by_distance(p)[0] for p in [
        (0, 124.664693451, 13),
    ]]
    fillet(fillet_4_edges, radius=FILLET_4_R)

    # 草图24 → 凸台-拉伸7 (add)
    with BuildSketch(Plane(origin=(0, 0, 8), x_dir=(-1, 0, 0), z_dir=(0, 0, -1))):
        with Locations((-32.889163634, 127.164522428)):
            Rectangle(SKETCH_24_W, SKETCH_24_H)
        with Locations((32.889163634, 127.164522428)):
            Rectangle(SKETCH_24_W, SKETCH_24_H)
    extrude(amount=EXTRUDE_7_DEPTH)

    # 草图25 → 凸台-拉伸8 (add)
    with BuildSketch(Plane(origin=(0, 129.664351405, 0), x_dir=(1, 0, 0), z_dir=(0, 1, 0))):
        Polygon((-29.889163634, 2), (-13.889163634, -8), (-29.889163634, -8), align=None)
        Polygon((29.889163634, -8), (13.889163634, -8), (29.889163634, 2), align=None)
    extrude(amount=-EXTRUDE_8_DEPTH)

    # 圆角5
    fillet_5_edges = [body_2.edges().sort_by_distance(p)[0] for p in [
        (-13.889163634, 127.164522405, 8),
        (-29.889163634, 127.164522405, -2),
        (13.889163634, 127.164522405, 8),
        (29.889163634, 127.164522405, -2),
    ]]
    fillet(fillet_5_edges, radius=FILLET_5_R)

    # 圆角6
    fillet_6_edges = [body_2.edges().sort_by_distance(p)[0] for p in [
        (35.889163634, 127.164522428, 18),
        (-35.889163634, 127.164522428, 18),
    ]]
    fillet(fillet_6_edges, radius=FILLET_6_R)

    # 草图27 → 凸台-拉伸9 (add)
    with BuildSketch(Plane(origin=(0, 129.664351405, 0), x_dir=(1, 0, 0), z_dir=(0, 1, 0))):
        with Locations((-27.389163634, 9.433981132)):
            Rectangle(SKETCH_27_W, SKETCH_27_H)
        with Locations((-27.389163634, 24)):
            Rectangle(SKETCH_27_W, SKETCH_27_H)
        with Locations((27.389163634, 24)):
            Rectangle(SKETCH_27_W, SKETCH_27_H)
        with Locations((27.389163634, 9.433981132)):
            Rectangle(SKETCH_27_W, SKETCH_27_H)
        with Locations((-27.389163634, 44)):
            Rectangle(SKETCH_27_W, SKETCH_27_H)
        with Locations((27.389163634, 44)):
            Rectangle(SKETCH_27_W, SKETCH_27_H)
    extrude(amount=-EXTRUDE_9_DEPTH)

    # 圆角7
    fillet_7_edges = [body_2.edges().sort_by_distance(p)[0] for p in [
        (29.889163634, 127.164522428, -6.433981132),
        (-29.889163634, 127.164522428, -6.433981132),
        (-29.889163634, 127.164522405, -12.433981132),
        (-29.889163634, 127.164522405, -41),
        (29.889163634, 127.164522405, -41),
        (-29.889163634, 127.164522405, -27),
        (-29.889163634, 127.164522405, -21),
        (29.889163634, 127.164522405, -21),
        (29.889163634, 127.164522405, -27),
        (29.889163634, 127.164522405, -12.433981132),
    ]]
    fillet(fillet_7_edges, radius=FILLET_7_R)

    # 圆角8
    fillet_8_edges = [body_2.edges().sort_by_distance(p)[0] for p in [
        (-24.889163634, 127.164522405, -6.433981132),
        (-24.889163634, 127.164522405, -12.433981132),
        (-24.889163634, 127.164522405, -41),
        (24.889163634, 127.164522405, -41),
        (-24.889163634, 127.164522405, -21),
        (-24.889163634, 127.164522405, -27),
        (24.889163634, 127.164522405, -21),
        (24.889163634, 127.164522405, -27),
        (24.889163634, 127.164522405, -12.433981132),
        (24.889163634, 127.164522405, -6.433981132),
    ]]
    fillet(fillet_8_edges, radius=FILLET_8_R)

    # 圆角9
    fillet_9_edges = [body_2.edges().sort_by_distance(p)[0] for p in [
        (35.889163634, 127.164522428, -47),
        (-35.889163634, 127.164522428, -47),
        (-24.889163634, 127.164522405, -47),
        (24.889163634, 127.164522405, -47),
    ]]
    fillet(fillet_9_edges, radius=FILLET_9_R)

    # 草图28 → 切除-拉伸19 (cut)
    with BuildSketch(Plane(origin=(0, 129.664351405, 0), x_dir=(1, 0, 0), z_dir=(0, 1, 0))):
        with Locations((-27.445843009, 44)):
            Circle(SKETCH_28_R)
        with Locations((-27.445843009, 24)):
            Circle(SKETCH_28_R)
        with Locations((-27.445843009, 9.433981132)):
            Circle(SKETCH_28_R)
        with Locations((27.445843009, 9.433981132)):
            Circle(SKETCH_28_R)
        with Locations((27.445843009, 24)):
            Circle(SKETCH_28_R)
        with Locations((27.445843009, 44)):
            Circle(SKETCH_28_R)
    extrude(amount=-CUT_EXTRUDE_19_DEPTH, mode=Mode.SUBTRACT)

    # 草图32 → 凸台-拉伸10 (add)
    with BuildSketch(Plane.XY.offset(-6.433981132)):
        Polygon((-35.889163634, 129.664351405), (-56.41665643, 116.841521654), (-58.663321092, 120.438106306), (-35.889163634, 134.664351405), (35.889163634, 134.664351405), (58.663321092, 120.438106306), (56.41665643, 116.841521654), (35.889163634, 129.664351405), align=None)
    extrude(amount=-EXTRUDE_10_DEPTH)

    # 草图33 → 切除-拉伸21 (cut, through all)
    with BuildSketch(Plane.XZ.offset(-124.664693451)):
        with Locations((-27.445843009, -9.433981132)):
            Circle(SKETCH_33_R)
        with Locations((27.445843009, -9.433981132)):
            Circle(SKETCH_33_R)
    extrude(amount=-CUT_EXTRUDE_21_DEPTH, mode=Mode.SUBTRACT)

    # 草图35 → 凸台-拉伸11 (add)
    with BuildSketch(Plane(origin=(0, 134.664351405, 0), x_dir=(1, 0, 0), z_dir=(0, 1, 0))):
        with Locations((-27.445843009, 9.433981132)):
            Rectangle(SKETCH_35_W, SKETCH_35_H)
        with Locations((-27.445843009, 9.433981132)):
            Circle(SKETCH_35_R, mode=Mode.SUBTRACT)
        with Locations((27.445843009, 9.433981132)):
            Rectangle(SKETCH_35_W, SKETCH_35_H)
        with Locations((27.445843009, 9.433981132)):
            Circle(SKETCH_35_R, mode=Mode.SUBTRACT)
    extrude(amount=EXTRUDE_11_DEPTH)

    # 草图36 → 切除-拉伸23 (cut)
    with BuildSketch(Plane.XY.offset(18)):
        Polygon((-35.889163634, 129.664351405), (35.889163634, 129.664351405), (35.889163634, 124.664693451), (35.889163634, 87.058009176), (-35.889163634, 87.058009176), (-35.889163634, 124.664693451), align=None)
    extrude(amount=-CUT_EXTRUDE_23_DEPTH, mode=Mode.SUBTRACT)

    # 草图37 → 切除-拉伸24 (cut)
    with BuildSketch(Plane(origin=(0, 129.664519159, 0), x_dir=(1, 0, 0), z_dir=(0, 1, 0))):
        with Locations((0, -15.5)):
            Rectangle(SKETCH_37_W, SKETCH_37_H)
    extrude(amount=-CUT_EXTRUDE_24_DEPTH, mode=Mode.SUBTRACT)

    # 圆角10
    fillet_10_edges = [body_2.edges().sort_by_distance(p)[0] for p in [
        (35.889163634, 134.664351405, -9.433981132),
        (-35.889163634, 134.664351405, -9.433981132),
    ]]
    fillet(fillet_10_edges, radius=FILLET_10_R)

    # 圆角11
    fillet_11_edges = [body_2.edges().sort_by_distance(p)[0] for p in [
        (58.663321092, 120.438106306, -9.433981132),
        (-58.663321092, 120.438106306, -9.433981132),
        (-56.41665643, 116.841521654, -9.433981132),
        (56.41665643, 116.841521654, -9.433981132),
    ]]
    fillet(fillet_11_edges, radius=FILLET_11_R)


solid = body_2.part
